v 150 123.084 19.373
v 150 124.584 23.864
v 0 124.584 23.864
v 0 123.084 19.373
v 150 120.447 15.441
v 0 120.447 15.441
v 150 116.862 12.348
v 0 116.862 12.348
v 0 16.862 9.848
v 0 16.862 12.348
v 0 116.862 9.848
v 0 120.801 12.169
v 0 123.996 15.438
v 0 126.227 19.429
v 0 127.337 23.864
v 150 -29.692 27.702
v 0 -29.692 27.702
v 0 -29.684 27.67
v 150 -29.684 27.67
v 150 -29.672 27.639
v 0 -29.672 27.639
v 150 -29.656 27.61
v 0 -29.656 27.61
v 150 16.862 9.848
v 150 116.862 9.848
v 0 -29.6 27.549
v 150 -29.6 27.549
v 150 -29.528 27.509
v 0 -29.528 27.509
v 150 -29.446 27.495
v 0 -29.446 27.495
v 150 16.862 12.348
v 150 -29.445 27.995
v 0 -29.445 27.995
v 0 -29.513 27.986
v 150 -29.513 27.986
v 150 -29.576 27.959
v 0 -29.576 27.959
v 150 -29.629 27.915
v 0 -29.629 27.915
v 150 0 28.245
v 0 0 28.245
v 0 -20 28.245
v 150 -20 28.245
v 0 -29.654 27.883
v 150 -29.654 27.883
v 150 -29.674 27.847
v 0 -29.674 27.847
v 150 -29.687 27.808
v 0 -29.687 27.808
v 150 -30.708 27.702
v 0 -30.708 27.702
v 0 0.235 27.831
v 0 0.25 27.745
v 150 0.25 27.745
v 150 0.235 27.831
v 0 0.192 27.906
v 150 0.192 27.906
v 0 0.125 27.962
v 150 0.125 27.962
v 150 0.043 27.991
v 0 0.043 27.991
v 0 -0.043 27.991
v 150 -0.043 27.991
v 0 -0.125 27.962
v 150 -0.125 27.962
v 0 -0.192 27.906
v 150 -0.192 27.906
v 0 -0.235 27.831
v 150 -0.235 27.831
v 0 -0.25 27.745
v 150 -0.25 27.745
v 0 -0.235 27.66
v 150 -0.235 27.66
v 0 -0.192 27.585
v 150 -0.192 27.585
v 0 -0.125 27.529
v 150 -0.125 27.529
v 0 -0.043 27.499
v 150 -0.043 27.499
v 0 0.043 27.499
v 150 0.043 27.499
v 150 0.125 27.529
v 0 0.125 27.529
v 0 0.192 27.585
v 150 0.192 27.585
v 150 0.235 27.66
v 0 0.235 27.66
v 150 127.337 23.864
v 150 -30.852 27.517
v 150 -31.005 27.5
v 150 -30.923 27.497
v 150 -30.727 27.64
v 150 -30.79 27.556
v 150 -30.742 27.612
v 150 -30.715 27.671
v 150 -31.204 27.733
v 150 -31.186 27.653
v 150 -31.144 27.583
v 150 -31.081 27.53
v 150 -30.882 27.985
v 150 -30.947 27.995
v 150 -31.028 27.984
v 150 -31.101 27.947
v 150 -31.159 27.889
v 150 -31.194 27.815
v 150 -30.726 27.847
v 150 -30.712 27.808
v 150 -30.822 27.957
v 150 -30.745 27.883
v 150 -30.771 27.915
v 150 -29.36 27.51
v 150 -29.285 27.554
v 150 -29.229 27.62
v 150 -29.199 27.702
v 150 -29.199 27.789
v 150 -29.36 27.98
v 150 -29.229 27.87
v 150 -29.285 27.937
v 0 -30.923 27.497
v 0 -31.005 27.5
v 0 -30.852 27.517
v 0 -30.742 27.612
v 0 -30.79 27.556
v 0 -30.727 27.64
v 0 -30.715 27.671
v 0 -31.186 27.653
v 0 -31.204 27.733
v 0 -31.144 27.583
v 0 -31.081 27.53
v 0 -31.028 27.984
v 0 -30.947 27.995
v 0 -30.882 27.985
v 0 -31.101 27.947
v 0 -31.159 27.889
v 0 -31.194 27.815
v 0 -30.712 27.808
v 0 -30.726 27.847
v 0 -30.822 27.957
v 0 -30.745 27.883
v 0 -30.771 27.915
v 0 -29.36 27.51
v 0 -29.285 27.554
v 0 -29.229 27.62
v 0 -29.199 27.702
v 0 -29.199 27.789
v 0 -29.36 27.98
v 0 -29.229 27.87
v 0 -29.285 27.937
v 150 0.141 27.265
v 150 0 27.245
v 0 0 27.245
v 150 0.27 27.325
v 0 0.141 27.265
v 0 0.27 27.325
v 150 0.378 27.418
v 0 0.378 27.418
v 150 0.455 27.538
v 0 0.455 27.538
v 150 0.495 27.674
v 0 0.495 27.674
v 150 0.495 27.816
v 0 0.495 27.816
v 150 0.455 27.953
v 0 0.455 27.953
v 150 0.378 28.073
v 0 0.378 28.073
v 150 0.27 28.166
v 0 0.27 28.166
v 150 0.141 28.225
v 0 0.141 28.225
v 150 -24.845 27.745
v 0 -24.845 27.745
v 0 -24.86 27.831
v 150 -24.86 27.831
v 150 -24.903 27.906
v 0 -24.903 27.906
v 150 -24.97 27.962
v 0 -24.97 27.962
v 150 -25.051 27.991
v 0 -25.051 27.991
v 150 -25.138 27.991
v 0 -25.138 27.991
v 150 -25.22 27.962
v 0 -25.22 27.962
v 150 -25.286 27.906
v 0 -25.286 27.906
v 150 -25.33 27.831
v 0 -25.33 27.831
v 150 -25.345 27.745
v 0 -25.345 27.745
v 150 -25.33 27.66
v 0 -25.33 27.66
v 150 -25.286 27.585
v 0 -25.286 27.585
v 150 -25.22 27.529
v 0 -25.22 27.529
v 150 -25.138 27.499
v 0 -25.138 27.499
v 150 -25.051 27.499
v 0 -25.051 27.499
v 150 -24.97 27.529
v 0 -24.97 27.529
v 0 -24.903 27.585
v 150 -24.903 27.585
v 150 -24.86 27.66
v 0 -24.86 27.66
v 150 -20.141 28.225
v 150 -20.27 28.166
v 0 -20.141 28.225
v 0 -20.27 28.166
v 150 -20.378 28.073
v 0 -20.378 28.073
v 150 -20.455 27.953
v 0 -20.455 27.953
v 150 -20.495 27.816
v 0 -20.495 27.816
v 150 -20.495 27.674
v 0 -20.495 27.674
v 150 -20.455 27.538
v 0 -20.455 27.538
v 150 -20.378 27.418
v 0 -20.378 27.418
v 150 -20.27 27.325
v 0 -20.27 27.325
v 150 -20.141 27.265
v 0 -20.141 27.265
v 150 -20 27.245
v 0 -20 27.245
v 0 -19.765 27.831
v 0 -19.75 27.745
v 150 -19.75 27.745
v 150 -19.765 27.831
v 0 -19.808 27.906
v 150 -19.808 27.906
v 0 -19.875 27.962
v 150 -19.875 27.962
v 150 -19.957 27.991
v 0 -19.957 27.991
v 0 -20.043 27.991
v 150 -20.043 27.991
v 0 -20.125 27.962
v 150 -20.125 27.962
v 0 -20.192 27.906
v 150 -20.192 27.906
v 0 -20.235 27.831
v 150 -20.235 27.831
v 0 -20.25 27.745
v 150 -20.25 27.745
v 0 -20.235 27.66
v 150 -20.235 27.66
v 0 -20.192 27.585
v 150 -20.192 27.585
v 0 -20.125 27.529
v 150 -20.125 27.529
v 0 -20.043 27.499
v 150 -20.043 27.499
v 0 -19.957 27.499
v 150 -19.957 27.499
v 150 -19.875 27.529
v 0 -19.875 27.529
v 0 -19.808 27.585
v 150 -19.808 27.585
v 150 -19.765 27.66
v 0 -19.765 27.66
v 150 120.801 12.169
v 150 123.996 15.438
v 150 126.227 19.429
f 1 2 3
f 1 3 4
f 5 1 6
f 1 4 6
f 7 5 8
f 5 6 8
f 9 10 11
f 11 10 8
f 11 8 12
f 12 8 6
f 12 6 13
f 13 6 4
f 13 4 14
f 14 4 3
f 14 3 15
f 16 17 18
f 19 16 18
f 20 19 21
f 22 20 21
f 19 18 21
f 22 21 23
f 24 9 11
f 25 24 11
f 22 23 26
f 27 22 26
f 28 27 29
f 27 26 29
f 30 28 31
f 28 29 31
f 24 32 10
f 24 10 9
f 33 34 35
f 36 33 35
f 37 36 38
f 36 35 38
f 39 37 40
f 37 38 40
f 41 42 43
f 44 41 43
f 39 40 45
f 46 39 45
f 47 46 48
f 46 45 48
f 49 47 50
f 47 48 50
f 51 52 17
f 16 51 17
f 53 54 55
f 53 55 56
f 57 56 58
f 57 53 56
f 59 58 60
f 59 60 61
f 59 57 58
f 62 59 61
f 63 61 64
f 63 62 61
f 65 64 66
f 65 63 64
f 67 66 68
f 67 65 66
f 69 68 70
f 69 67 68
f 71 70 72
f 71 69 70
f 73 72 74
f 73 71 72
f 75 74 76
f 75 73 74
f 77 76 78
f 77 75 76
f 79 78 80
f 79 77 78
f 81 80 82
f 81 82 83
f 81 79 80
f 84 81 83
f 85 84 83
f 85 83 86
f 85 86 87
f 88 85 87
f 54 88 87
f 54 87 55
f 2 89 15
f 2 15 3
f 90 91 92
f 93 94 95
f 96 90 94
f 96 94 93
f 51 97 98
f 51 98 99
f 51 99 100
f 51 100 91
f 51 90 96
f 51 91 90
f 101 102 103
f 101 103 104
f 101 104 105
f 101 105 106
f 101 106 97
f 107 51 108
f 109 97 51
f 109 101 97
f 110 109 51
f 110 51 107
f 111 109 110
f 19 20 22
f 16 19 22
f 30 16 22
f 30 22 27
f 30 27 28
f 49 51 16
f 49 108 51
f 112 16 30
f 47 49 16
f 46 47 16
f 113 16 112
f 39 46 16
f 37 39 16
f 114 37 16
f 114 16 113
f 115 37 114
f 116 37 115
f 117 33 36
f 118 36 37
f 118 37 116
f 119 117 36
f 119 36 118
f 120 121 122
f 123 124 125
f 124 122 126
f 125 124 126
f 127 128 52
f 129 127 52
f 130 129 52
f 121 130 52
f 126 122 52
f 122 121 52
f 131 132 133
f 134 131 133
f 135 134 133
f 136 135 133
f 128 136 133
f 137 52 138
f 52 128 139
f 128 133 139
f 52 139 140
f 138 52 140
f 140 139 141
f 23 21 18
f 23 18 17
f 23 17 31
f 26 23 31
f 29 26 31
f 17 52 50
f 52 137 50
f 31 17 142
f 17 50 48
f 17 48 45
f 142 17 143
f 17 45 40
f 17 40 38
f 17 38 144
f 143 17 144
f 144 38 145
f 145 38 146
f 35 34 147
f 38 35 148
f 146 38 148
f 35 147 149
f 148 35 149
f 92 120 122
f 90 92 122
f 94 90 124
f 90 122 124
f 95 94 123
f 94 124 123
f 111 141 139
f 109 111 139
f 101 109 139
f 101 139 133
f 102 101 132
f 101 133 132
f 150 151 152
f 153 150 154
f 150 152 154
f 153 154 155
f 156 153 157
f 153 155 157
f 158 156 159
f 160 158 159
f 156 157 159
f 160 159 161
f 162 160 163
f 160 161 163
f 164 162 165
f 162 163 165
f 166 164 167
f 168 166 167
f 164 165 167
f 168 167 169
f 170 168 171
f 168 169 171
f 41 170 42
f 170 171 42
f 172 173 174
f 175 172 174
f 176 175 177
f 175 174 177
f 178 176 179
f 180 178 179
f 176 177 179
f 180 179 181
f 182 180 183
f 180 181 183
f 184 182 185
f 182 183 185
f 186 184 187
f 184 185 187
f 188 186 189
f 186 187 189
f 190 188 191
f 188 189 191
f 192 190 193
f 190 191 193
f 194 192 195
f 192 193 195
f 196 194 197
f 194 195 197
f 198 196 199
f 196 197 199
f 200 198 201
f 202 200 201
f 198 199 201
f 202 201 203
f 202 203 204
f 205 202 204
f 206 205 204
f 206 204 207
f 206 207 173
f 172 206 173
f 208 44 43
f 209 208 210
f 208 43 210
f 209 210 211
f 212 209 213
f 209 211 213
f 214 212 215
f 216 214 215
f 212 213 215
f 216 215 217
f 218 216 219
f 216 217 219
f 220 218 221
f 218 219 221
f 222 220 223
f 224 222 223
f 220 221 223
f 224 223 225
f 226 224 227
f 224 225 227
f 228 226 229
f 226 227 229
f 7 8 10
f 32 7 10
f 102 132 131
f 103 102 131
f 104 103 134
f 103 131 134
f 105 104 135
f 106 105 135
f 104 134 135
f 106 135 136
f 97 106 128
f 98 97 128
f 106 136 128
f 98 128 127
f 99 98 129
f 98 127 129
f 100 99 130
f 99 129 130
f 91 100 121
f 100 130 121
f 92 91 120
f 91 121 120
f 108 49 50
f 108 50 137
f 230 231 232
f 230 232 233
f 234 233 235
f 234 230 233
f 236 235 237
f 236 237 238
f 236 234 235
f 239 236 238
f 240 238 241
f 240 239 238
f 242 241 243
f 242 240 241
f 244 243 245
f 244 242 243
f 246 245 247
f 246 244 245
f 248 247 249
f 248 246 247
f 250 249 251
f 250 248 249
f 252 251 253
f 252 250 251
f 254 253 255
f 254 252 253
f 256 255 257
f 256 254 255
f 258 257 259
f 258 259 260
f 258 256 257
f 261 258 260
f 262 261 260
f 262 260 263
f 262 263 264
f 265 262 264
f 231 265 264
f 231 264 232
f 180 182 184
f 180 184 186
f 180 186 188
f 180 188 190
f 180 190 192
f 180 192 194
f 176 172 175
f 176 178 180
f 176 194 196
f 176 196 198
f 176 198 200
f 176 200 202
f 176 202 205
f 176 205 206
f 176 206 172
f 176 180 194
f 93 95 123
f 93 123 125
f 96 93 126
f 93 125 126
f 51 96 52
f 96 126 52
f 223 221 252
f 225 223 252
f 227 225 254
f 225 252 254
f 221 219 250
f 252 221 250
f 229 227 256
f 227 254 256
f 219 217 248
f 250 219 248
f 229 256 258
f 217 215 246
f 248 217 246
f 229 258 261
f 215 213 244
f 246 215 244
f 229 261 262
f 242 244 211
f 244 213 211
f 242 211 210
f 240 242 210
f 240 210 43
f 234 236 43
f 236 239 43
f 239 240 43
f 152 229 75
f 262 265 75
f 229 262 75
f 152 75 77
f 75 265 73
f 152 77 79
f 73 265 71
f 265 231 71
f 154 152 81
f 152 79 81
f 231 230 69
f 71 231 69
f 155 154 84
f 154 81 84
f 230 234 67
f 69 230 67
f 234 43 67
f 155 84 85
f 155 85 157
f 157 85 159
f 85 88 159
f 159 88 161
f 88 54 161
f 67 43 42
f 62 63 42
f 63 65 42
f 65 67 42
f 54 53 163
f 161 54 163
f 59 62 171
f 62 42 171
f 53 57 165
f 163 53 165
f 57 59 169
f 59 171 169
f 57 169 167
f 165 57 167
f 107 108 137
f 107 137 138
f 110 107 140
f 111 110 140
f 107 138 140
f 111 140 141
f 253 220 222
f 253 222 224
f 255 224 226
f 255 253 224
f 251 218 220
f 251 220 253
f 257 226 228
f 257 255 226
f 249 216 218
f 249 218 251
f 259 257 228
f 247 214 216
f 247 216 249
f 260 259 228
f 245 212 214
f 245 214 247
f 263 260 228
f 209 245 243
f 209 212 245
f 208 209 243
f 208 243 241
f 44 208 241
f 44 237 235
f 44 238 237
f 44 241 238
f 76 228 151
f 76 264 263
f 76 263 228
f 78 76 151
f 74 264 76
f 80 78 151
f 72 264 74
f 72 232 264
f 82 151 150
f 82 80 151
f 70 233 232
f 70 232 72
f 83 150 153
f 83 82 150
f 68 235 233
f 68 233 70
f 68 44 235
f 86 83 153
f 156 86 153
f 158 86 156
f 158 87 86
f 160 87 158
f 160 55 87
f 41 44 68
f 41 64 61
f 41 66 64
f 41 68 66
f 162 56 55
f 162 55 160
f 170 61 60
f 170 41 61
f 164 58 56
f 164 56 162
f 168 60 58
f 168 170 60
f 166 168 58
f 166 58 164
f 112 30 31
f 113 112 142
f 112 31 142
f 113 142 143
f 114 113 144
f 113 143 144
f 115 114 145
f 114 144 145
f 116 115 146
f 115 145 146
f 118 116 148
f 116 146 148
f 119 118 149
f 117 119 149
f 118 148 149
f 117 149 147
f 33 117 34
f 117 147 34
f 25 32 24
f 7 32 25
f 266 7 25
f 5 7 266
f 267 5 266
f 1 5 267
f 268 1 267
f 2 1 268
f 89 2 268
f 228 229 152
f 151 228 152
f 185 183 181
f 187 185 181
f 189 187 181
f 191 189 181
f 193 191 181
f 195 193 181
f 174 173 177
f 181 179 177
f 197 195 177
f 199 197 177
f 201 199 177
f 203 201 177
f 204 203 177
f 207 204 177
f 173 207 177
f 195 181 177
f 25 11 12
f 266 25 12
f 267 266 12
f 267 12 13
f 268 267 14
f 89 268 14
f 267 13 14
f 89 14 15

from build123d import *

# Parameters (mm, degrees)
F0_R     = 0.25
F1_DEPTH = 150
F2_DEPTH = 150
F3_DEPTH = 150
F4_DEPTH = 150


with BuildPart() as f1:
    # F0 (on Right) → F1 (new body)
    with BuildSketch(Plane.YZ):
        with BuildLine():
            Line((0, 28.245231), (-20, 28.245231))
            ThreePointArc((-20, 28.245231), (-20.5, 27.745231), (-20, 27.245231))
            Line((-20, 27.245231), (0, 27.245231))
            ThreePointArc((0, 27.245231), (0.5, 27.745231), (0, 28.245231))
        make_face()
        with Locations((-20, 27.745231)):
            Circle(F0_R, mode=Mode.SUBTRACT)
        with Locations((0, 27.745231)):
            Circle(F0_R, mode=Mode.SUBTRACT)
    extrude(amount=F1_DEPTH)


with BuildPart() as f2:
    # F0 (on Right) → F2 (new body)
    with BuildSketch(Plane.YZ):
        with Locations((-25.094866, 27.745231)):
            Circle(F0_R)
    extrude(amount=F2_DEPTH)


with BuildPart() as f3:
    # F0 (on Right) → F3 (new body)
    with BuildSketch(Plane.YZ):
        with BuildLine():
            Line((116.861985, 12.347517), (16.861985, 12.347517))
            Line((16.861985, 12.347517), (16.861985, 9.847517))
            Line((16.861985, 9.847517), (116.861985, 9.847517))
            ThreePointArc((116.861985, 9.847517), (123.996263, 15.438008), (127.337039, 23.863608))
            Line((127.337039, 23.863608), (124.58434, 23.863608))
            ThreePointArc((124.58434, 23.863608), (121.897268, 17.318241), (116.861985, 12.347517))
        make_face()
    extrude(amount=F3_DEPTH)


with BuildPart() as f4:
    # F0 (on Right) → F4 (new body)
    with BuildSketch(Plane.YZ):
        with BuildLine():
            ThreePointArc((-29.445458, 27.995231), (-29.545362, 27.974393), (-29.628614, 27.915369))
            ThreePointArc((-29.628614, 27.915369), (-29.664619, 27.865482), (-29.68735, 27.808313))
            Line((-29.68735, 27.808313), (-30.712033, 27.808313))
            ThreePointArc((-30.712033, 27.808313), (-30.734764, 27.865482), (-30.770769, 27.915369))
            ThreePointArc((-30.770769, 27.915369), (-30.850632, 27.972885), (-30.946507, 27.99512))
            ThreePointArc((-30.946507, 27.99512), (-31.203658, 27.733284), (-30.922685, 27.497192))
            ThreePointArc((-30.922685, 27.497192), (-30.819696, 27.534333), (-30.742453, 27.611919))
            ThreePointArc((-30.742453, 27.611919), (-30.720607, 27.655486), (-30.707629, 27.702463))
            Line((-30.707629, 27.702463), (-29.691754, 27.702463))
            ThreePointArc((-29.691754, 27.702463), (-29.678468, 27.654688), (-29.656013, 27.610476))
            ThreePointArc((-29.656013, 27.610476), (-29.565609, 27.526006), (-29.445772, 27.495231))
            ThreePointArc((-29.445772, 27.495231), (-29.19544, 27.745074), (-29.445458, 27.995231))
        make_face()
    extrude(amount=F4_DEPTH)


solid = Compound([f1.part, f2.part, f3.part, f4.part])
